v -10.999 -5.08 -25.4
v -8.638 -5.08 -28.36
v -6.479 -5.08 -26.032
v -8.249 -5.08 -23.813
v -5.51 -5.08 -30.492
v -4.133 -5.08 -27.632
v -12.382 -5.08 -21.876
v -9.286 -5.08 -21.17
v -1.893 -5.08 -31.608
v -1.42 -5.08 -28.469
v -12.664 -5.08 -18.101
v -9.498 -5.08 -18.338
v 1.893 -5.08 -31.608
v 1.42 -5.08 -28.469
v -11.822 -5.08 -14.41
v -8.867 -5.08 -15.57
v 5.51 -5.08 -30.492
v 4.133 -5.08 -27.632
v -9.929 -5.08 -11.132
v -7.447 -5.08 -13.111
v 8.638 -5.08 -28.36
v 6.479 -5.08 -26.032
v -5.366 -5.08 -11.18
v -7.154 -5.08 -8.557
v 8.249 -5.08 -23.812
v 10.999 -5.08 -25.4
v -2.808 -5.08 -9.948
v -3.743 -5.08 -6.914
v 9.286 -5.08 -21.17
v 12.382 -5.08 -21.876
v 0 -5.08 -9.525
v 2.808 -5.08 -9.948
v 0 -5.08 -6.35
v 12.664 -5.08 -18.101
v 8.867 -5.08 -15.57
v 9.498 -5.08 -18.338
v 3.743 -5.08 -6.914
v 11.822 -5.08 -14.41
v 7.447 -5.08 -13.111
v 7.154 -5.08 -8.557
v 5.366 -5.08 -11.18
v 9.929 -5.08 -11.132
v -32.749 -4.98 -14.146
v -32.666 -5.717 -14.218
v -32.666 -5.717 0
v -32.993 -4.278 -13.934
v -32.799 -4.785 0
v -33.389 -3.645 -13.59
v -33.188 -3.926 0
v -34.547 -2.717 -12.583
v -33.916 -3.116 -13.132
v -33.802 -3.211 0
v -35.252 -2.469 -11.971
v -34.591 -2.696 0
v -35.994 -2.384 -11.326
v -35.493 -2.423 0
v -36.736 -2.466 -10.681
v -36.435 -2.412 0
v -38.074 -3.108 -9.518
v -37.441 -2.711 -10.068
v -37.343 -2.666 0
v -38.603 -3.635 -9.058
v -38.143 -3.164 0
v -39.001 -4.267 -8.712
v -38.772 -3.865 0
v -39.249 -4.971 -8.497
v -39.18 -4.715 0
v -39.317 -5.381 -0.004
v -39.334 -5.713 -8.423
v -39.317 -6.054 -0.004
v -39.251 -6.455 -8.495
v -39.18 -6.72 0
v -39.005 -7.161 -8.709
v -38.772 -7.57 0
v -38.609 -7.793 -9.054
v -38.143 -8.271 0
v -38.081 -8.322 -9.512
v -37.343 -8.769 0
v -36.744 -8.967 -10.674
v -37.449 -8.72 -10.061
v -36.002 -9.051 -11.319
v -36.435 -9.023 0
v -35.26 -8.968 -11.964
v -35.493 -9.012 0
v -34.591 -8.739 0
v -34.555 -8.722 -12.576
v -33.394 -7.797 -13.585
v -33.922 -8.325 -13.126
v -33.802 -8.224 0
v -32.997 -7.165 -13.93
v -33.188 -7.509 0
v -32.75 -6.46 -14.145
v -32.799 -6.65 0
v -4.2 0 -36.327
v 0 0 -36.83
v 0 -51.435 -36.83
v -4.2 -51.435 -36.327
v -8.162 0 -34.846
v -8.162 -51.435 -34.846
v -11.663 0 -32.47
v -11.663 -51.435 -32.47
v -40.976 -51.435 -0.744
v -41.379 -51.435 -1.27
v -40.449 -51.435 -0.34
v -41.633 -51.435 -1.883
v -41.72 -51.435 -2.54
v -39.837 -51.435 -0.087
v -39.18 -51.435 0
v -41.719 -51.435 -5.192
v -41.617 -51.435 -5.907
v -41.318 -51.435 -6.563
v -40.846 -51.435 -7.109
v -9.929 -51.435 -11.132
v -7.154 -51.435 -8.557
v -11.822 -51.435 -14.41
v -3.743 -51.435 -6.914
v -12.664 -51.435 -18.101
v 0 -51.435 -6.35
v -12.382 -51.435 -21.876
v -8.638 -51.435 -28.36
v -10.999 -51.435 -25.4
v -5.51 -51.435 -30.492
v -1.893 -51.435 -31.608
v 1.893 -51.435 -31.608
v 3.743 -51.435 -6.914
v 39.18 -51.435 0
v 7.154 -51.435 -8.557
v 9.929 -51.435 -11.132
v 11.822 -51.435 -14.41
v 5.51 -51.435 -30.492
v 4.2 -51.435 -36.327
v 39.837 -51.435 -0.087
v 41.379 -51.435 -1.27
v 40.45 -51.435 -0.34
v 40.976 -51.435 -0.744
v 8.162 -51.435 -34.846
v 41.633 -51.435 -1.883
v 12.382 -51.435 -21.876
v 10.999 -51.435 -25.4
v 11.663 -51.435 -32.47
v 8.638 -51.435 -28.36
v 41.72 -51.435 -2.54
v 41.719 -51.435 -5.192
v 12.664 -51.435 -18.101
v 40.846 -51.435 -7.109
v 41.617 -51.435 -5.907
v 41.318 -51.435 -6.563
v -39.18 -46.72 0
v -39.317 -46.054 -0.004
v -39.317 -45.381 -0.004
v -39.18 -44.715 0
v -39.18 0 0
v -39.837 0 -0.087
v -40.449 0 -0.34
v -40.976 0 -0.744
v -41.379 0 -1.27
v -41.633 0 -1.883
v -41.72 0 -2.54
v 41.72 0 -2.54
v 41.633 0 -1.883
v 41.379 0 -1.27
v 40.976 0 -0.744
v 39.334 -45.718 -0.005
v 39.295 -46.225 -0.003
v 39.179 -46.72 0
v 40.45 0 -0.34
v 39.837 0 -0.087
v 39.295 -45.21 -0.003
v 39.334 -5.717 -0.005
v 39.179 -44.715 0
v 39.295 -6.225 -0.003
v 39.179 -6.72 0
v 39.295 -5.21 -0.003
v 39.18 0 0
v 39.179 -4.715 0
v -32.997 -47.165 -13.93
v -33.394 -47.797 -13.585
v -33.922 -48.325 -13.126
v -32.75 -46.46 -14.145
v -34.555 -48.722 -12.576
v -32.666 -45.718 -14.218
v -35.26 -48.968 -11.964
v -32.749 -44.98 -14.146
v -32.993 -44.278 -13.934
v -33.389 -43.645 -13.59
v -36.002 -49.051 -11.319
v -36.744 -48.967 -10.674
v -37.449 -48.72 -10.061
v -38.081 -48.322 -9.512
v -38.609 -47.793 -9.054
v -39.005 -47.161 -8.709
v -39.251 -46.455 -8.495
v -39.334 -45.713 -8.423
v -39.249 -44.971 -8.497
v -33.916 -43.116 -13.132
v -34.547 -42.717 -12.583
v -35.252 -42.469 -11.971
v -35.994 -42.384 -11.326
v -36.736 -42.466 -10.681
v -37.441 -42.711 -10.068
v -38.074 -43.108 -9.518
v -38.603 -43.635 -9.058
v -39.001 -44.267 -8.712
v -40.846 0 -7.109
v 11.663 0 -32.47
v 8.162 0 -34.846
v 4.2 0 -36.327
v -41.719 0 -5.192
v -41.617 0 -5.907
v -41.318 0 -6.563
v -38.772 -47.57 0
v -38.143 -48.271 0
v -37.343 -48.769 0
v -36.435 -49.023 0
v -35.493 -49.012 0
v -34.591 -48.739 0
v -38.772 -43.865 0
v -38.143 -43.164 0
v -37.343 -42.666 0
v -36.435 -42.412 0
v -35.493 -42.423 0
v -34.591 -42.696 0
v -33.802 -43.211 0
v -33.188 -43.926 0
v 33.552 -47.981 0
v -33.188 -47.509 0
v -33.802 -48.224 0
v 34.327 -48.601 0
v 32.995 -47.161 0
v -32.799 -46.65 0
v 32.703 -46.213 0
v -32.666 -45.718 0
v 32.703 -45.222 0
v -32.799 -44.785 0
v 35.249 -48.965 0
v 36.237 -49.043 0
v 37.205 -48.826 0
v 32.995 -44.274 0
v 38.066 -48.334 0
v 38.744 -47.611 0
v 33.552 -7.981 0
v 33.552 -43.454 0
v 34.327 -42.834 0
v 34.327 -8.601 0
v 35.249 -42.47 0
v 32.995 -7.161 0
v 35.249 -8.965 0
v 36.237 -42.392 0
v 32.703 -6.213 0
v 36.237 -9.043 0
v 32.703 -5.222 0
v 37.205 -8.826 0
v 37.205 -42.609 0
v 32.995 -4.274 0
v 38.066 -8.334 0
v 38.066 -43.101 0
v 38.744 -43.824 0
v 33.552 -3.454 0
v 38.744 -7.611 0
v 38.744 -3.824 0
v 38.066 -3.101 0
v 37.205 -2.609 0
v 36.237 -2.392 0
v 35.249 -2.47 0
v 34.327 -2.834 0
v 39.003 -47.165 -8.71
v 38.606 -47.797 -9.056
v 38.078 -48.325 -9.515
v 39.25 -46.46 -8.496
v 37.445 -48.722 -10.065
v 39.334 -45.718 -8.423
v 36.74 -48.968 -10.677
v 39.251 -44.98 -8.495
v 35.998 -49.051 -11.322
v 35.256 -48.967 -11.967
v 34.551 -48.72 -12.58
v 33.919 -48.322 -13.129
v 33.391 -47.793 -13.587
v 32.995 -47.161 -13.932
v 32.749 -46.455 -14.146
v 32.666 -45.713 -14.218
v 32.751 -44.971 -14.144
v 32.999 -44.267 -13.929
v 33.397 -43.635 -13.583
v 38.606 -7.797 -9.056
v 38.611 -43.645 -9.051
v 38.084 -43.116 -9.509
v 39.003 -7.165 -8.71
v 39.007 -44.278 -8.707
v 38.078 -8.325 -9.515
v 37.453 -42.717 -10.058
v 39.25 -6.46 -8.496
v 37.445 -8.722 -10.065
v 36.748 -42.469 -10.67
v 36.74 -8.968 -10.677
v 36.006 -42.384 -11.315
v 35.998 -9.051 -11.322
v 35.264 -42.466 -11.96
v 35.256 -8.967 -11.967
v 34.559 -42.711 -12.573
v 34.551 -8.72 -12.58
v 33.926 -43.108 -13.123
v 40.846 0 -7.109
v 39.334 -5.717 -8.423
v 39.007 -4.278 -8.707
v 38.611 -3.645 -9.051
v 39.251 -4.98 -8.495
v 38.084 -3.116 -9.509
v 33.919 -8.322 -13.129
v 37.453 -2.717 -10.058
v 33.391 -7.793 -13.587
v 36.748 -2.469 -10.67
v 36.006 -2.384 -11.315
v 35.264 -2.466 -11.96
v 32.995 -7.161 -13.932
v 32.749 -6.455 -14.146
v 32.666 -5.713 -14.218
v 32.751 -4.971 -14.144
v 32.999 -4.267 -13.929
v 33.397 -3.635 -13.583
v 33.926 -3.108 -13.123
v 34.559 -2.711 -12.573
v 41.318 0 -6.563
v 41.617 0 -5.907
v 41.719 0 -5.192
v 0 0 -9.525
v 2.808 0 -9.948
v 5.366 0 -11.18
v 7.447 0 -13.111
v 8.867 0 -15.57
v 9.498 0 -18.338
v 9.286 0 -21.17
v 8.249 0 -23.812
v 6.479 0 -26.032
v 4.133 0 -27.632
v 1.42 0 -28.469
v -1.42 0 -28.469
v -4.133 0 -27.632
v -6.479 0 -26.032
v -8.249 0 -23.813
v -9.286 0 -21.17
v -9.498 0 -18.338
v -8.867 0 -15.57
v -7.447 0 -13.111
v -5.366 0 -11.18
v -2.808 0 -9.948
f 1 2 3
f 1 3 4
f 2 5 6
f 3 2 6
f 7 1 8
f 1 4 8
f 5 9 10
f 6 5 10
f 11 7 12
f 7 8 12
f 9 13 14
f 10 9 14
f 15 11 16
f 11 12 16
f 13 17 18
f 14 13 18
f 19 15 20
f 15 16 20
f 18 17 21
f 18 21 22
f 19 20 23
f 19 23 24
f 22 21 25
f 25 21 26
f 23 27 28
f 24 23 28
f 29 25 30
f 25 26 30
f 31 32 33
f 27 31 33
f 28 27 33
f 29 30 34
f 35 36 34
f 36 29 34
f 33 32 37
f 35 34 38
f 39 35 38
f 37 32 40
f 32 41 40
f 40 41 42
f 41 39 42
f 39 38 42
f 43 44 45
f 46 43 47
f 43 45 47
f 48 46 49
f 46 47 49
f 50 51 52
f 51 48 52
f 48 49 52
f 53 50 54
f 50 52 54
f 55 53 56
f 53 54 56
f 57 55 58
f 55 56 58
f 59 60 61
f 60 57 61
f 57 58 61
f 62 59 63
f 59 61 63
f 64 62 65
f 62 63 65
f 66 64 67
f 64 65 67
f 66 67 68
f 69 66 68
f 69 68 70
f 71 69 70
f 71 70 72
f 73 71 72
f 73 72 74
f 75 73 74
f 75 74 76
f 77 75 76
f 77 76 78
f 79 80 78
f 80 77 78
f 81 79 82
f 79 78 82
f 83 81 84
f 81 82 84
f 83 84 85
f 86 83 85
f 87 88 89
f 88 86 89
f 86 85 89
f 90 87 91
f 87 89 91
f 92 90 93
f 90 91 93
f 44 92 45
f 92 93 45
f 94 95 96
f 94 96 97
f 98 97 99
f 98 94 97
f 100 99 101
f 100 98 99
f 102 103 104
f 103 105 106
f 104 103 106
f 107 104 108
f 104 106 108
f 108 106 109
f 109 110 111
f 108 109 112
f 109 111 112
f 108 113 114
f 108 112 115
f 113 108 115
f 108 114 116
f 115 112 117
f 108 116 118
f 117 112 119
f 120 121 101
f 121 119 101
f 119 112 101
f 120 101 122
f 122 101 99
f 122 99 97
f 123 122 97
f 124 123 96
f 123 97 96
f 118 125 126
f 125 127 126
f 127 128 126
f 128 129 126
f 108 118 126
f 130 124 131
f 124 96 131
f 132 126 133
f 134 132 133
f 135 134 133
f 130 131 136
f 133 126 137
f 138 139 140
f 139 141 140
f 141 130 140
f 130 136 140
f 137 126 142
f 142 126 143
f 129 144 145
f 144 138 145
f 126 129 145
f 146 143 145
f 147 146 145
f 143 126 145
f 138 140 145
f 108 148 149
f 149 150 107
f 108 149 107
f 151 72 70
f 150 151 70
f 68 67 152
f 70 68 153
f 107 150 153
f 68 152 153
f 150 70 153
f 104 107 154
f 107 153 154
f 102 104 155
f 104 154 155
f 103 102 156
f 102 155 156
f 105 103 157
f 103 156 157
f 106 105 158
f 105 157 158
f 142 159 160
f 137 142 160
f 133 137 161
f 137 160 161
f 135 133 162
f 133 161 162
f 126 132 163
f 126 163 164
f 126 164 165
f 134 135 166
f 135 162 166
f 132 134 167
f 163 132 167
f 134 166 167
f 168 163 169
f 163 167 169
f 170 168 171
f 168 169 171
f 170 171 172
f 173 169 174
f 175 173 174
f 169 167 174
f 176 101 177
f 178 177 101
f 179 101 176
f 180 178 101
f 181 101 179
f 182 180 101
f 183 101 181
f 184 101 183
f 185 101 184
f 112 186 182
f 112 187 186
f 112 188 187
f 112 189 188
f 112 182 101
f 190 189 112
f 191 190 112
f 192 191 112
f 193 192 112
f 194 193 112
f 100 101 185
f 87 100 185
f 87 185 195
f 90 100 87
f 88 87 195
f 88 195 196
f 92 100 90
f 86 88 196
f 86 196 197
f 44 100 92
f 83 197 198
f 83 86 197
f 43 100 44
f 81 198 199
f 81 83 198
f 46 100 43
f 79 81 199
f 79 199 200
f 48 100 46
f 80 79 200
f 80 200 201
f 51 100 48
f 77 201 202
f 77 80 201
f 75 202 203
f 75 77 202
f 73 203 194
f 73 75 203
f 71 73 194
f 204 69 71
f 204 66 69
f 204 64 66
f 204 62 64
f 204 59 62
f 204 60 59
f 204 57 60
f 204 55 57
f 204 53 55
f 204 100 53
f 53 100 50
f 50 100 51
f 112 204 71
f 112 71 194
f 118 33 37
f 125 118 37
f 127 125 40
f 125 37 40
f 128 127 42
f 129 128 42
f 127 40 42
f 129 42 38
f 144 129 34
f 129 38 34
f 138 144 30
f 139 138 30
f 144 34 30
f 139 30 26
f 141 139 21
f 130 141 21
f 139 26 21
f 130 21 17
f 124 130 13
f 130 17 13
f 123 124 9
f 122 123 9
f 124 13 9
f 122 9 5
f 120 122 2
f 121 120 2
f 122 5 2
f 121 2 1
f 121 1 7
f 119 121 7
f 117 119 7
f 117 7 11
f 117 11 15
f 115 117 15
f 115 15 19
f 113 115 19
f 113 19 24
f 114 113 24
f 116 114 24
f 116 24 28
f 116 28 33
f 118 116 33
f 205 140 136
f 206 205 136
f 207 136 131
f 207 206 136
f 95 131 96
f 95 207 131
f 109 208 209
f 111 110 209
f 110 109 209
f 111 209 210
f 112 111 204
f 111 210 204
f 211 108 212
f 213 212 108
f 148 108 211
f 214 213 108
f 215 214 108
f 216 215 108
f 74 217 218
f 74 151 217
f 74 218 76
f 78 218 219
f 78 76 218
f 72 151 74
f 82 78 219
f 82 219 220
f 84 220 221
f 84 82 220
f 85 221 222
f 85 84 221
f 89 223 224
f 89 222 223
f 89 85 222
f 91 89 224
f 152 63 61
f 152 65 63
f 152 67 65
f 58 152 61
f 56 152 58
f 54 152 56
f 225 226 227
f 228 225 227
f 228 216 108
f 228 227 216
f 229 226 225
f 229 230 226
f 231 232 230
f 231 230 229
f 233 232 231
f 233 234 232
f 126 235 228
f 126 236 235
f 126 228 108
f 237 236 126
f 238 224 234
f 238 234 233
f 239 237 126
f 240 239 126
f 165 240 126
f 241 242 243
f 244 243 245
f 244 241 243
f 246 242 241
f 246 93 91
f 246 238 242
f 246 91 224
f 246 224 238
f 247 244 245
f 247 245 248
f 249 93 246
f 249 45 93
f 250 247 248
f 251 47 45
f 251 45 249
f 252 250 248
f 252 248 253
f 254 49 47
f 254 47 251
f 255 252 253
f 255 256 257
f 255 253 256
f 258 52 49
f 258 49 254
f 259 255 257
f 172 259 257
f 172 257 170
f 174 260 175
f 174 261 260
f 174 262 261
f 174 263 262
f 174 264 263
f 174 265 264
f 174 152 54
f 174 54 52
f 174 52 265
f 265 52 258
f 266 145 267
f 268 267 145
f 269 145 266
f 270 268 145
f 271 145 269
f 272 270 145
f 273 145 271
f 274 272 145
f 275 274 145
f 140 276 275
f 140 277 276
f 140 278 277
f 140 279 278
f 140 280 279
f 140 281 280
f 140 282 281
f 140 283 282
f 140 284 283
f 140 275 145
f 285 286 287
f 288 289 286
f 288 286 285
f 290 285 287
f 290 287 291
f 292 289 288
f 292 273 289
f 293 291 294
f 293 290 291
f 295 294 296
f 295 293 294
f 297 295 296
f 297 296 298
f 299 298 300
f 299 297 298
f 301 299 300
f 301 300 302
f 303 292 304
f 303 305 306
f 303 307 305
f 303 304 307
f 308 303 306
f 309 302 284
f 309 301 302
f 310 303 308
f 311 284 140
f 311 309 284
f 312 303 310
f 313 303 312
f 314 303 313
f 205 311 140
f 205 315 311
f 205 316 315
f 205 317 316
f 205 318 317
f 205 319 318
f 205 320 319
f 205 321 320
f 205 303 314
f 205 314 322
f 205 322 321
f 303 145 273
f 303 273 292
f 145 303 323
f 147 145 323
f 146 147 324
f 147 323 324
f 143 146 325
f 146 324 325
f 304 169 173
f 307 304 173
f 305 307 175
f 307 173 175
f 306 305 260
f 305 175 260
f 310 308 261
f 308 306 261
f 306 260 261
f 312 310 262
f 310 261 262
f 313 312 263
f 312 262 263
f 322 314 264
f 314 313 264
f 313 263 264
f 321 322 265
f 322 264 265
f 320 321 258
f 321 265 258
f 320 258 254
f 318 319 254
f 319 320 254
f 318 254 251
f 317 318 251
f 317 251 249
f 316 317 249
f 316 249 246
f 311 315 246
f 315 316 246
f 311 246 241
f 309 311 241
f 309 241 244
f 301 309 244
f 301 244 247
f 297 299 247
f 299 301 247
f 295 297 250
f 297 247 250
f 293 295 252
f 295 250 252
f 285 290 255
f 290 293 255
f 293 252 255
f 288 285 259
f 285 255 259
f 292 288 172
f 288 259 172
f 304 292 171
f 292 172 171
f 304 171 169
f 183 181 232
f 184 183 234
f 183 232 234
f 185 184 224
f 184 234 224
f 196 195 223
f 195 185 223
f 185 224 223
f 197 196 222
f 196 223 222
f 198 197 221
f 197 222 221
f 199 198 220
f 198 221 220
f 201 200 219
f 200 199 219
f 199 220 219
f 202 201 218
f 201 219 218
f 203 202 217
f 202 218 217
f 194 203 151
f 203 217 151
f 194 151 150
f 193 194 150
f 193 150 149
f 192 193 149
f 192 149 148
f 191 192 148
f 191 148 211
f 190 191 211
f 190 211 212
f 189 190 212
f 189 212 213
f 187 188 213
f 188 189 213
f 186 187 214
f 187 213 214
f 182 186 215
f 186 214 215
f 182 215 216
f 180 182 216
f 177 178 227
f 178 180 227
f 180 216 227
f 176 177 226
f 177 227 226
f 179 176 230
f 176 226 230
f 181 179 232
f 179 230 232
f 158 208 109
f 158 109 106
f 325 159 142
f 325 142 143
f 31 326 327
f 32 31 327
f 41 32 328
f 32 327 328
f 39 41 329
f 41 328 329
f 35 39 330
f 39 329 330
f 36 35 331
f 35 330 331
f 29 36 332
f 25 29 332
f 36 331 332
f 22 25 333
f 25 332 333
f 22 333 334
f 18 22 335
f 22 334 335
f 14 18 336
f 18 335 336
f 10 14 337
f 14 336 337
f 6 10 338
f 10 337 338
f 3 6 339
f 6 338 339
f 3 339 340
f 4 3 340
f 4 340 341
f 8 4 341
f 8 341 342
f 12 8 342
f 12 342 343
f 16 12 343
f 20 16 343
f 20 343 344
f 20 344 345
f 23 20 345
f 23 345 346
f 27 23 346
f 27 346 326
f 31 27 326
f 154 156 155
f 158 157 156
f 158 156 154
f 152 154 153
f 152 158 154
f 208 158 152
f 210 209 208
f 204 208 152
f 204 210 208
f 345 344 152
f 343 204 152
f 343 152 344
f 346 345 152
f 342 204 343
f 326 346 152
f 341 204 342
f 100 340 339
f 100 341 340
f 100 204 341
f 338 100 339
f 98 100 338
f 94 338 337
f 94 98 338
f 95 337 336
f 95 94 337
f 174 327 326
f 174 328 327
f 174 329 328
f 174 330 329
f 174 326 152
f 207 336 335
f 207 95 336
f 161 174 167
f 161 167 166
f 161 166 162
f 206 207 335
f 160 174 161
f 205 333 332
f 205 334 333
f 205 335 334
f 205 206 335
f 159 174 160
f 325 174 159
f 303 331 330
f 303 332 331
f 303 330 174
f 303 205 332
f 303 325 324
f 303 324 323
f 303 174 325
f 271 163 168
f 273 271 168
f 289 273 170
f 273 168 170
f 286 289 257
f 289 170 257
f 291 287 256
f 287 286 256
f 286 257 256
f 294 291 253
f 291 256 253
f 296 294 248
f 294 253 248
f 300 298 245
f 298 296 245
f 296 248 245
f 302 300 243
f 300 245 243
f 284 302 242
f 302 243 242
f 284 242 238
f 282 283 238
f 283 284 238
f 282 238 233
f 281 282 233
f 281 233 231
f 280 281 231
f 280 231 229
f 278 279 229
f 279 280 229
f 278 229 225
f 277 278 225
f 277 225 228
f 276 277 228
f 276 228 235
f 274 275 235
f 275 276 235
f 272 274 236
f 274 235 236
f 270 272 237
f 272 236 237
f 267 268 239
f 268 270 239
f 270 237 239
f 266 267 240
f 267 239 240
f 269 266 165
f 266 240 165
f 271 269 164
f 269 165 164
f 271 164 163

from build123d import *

# Parameters (mm, degrees)
CROQUIS2_R              = 12.7
CROQUIS2_R_2            = 9.525
SALIENTE_EXTRUIR1_DEPTH = 51.435
CORTAR_EXTRUIR1_START   = -5.08
CROQUIS3_R              = 12.7
CORTAR_EXTRUIR1_DEPTH   = 71.699448436
CROQUIS4_R              = 3.33375
SALIENTE_EXTRUIR3_DEPTH = 6.35
CROQUIS4_2_R            = 3.33375
CORTAR_EXTRUIR3_DEPTH   = 76.779448436
REDONDEO3_R             = 2.54


with BuildPart() as part:
    # Croquis2 → Saliente-Extruir1 (new body)
    # profile 1 of 2: a face of its own
    with BuildSketch(Plane(origin=(0, 0, 0), x_dir=(1, 0, 0), z_dir=(0, 1, 0))):
        with BuildLine():
            Line((41.7195, 6.35), (11.662827783, 32.470389268))
            ThreePointArc((11.662827783, 32.470389268), (6.225507161, 35.70447269), (0, 36.83))
            ThreePointArc((0, 36.83), (-6.225507161, 35.70447269), (-11.662827783, 32.470389268))
            Line((-11.662827783, 32.470389268), (-41.7195, 6.35))
            Line((-41.7195, 6.35), (-41.7195, 0))
            Line((-41.7195, 0), (41.7195, 0))
            Line((41.7195, 0), (41.7195, 6.35))
        make_face()
        with Locations((0, 19.05)):
            Circle(CROQUIS2_R, mode=Mode.SUBTRACT)
    # profile 2 of 2: a face of its own
    with BuildSketch(Plane(origin=(0, 0, 0), x_dir=(1, 0, 0), z_dir=(0, 1, 0))):
        with Locations((0, 19.05)):
            Circle(CROQUIS2_R)
        with Locations(Location((0, 19.05, 0), (0, 0, 270))):
            Circle(CROQUIS2_R_2, mode=Mode.SUBTRACT)
    extrude(amount=-SALIENTE_EXTRUIR1_DEPTH)

    # Croquis3 → Cortar-Extruir1 (cut, through all)
    with BuildSketch(Plane(origin=(0, 0, 0), x_dir=(1, 0, 0), z_dir=(0, 1, 0)).offset(CORTAR_EXTRUIR1_START)):
        with Locations(Location((0, 19.05, 0), (0, 0, 270))):
            Circle(CROQUIS3_R)
    extrude(amount=-CORTAR_EXTRUIR1_DEPTH, mode=Mode.SUBTRACT)

    # Croquis4 → Saliente-Extruir3 (add)
    with BuildSketch(Plane.XY):
        with Locations((-36.000000009, -5.717499995)):
            Circle(CROQUIS4_R)
        with Locations((36.000000009, -5.717499995)):
            Circle(CROQUIS4_R)
        with Locations((36.000000009, -45.717500005)):
            Circle(CROQUIS4_R)
        with Locations((-36.000000009, -45.717500005)):
            Circle(CROQUIS4_R)
    extrude(amount=-SALIENTE_EXTRUIR3_DEPTH)

    # Croquis4<2> → Cortar-Extruir3 (cut, through all)
    with BuildSketch(Plane.XY):
        with Locations((-36.000000009, -5.717499995)):
            Circle(CROQUIS4_2_R)
        with Locations((36.000000009, -5.717499995)):
            Circle(CROQUIS4_2_R)
        with Locations((36.000000009, -45.717500005)):
            Circle(CROQUIS4_2_R)
        with Locations((-36.000000009, -45.717500005)):
            Circle(CROQUIS4_2_R)
    extrude(amount=-CORTAR_EXTRUIR3_DEPTH, mode=Mode.SUBTRACT)

    # Redondeo3
    # the kernel refuses this fillet: 2.54 mm, written as the material it takes off along each edge
    with BuildSketch(Plane(origin=(41.7195, 2.894405132, -6.35), x_dir=(-0.7548025459958689, 0, -0.6559520687963062), z_dir=(0, -1, 0))) as redondeo3_piece_1:
        with BuildLine():
            CenterArc((REDONDEO3_R * 0.455811831887, -REDONDEO3_R), REDONDEO3_R, 90, 49.008119667)
            Line((-REDONDEO3_R * 0.298990714108, -REDONDEO3_R * 0.344047931204), (0, 0))
            Line((0, 0), (REDONDEO3_R * 0.455811831887, 0))
        make_face()
    extrude(amount=57.223810265, mode=Mode.SUBTRACT)
    with BuildSketch(Plane(origin=(41.7195, 6.35, 0), x_dir=(0, 0, -1), z_dir=(0, -1, 0)), Plane(origin=(-41.7195, 6.35, 0), x_dir=(1, 0, 0), z_dir=(0, -1, 0))) as redondeo3_piece_2:
        with BuildLine():
            CenterArc((REDONDEO3_R, -REDONDEO3_R), REDONDEO3_R, 90, 90)
            Line((0, -REDONDEO3_R), (0, 0))
            Line((0, 0), (REDONDEO3_R, 0))
        make_face()
    extrude(amount=64.135, mode=Mode.SUBTRACT)
    with BuildSketch(Plane(origin=(-41.7195, 2.894405132, -6.35), x_dir=(0.7548025459958687, 0, -0.6559520687963067), z_dir=(0, -1, 0))) as redondeo3_piece_3:
        with BuildLine():
            CenterArc((REDONDEO3_R * 0.455811831887, REDONDEO3_R), REDONDEO3_R, 220.991880333, 49.008119667)
            Line((-REDONDEO3_R * 0.298990714108, REDONDEO3_R * 0.344047931204), (0, 0))
            Line((0, 0), (REDONDEO3_R * 0.455811831887, 0))
        make_face()
    extrude(amount=57.223810265, mode=Mode.SUBTRACT)


solid = part.part
